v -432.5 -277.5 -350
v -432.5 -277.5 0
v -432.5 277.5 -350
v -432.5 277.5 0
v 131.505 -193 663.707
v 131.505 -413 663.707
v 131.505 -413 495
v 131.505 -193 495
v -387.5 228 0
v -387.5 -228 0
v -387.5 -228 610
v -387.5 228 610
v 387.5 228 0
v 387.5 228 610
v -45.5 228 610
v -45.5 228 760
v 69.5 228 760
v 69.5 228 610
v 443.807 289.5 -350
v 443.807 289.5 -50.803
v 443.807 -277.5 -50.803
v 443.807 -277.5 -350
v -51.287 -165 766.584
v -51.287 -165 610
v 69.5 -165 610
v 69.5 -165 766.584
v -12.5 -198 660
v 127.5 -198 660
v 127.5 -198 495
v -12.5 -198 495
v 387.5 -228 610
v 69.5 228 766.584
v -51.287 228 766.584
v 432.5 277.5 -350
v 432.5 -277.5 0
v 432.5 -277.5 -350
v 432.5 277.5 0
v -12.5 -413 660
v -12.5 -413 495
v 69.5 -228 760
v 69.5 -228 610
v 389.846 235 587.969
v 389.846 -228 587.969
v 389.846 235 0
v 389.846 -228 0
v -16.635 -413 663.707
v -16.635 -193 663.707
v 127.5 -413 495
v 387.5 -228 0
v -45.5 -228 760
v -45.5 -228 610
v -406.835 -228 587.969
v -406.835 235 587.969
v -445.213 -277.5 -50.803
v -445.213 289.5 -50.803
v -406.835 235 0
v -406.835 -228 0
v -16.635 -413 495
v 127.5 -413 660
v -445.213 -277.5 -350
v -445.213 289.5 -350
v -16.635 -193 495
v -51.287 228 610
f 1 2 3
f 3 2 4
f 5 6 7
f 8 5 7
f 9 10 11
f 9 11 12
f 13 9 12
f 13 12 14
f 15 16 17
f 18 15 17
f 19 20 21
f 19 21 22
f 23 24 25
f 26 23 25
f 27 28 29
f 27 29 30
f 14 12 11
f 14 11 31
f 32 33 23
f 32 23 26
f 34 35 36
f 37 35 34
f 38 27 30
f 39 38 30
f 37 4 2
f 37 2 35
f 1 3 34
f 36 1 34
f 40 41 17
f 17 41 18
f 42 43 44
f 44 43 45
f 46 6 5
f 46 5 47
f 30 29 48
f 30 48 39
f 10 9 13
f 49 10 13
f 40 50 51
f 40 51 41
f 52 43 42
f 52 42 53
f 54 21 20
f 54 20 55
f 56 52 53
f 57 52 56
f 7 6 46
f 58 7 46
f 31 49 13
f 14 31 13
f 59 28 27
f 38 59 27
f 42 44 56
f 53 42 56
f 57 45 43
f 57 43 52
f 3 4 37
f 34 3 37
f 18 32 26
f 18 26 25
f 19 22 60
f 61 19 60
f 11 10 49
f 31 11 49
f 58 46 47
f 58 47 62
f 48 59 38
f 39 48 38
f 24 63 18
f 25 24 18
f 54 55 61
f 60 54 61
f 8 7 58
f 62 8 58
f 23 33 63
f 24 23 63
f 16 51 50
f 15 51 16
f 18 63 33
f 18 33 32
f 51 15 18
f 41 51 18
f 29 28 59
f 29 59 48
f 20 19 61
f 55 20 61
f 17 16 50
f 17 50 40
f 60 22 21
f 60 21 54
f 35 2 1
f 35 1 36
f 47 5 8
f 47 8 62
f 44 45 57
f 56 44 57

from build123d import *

# Parameters (mm, degrees)
SCHIZZO1_W                        = 865
SCHIZZO1_H                        = 555
ESTRUSIONE_ESTRUSIONE1_DEPTH      = 350
SCHIZZO2_W                        = 775
SCHIZZO2_H                        = 456
ESTRUSIONE_ESTRUSIONE2_DEPTH      = 610
SCHIZZO3_W                        = 115
SCHIZZO3_H                        = 456
ESTRUSIONE_ESTRUSIONE3_DEPTH      = 150
ESTRUSIONE_ESTRUSIONE4_DEPTH      = 185
ESTRUSIONE_ESTRUSIONE4_DEPTH_BACK = 30
SCHIZZO4_W                        = 140
SCHIZZO4_H                        = 165
SCHIZZO5_W                        = 889.020655165
SCHIZZO5_H                        = 299.196711451
ESTRUSIONE_ESTRUSIONE5_DEPTH      = 567
SCHIZZO6_W                        = 796.680903304
SCHIZZO6_H                        = 587.968632113
ESTRUSIONE_ESTRUSIONE6_DEPTH      = 463
SCHIZZO7_W                        = 148.139846742
SCHIZZO7_H                        = 168.706943007
ESTRUSIONE_ESTRUSIONE7_DEPTH      = 220
SCHIZZO8_W                        = 120.787004933
SCHIZZO8_H                        = 156.583617578
ESTRUSIONE_ESTRUSIONE8_DEPTH      = 393


with BuildPart() as part:
    # Schizzo1 → Estrusione-Estrusione1 (new body)
    with BuildSketch(Plane.XY):
        Rectangle(SCHIZZO1_W, SCHIZZO1_H)
    extrude(amount=-ESTRUSIONE_ESTRUSIONE1_DEPTH)


with BuildPart() as body_2:
    # Schizzo2 → Estrusione-Estrusione2 (new body)
    with BuildSketch(Plane.XY):
        Rectangle(SCHIZZO2_W, SCHIZZO2_H)
    extrude(amount=ESTRUSIONE_ESTRUSIONE2_DEPTH)


with BuildPart() as body_3:
    # Schizzo3 → Estrusione-Estrusione3 (new body)
    with BuildSketch(Plane.XY.offset(610)):
        with Locations((12, 0)):
            Rectangle(SCHIZZO3_W, SCHIZZO3_H)
    extrude(amount=ESTRUSIONE_ESTRUSIONE3_DEPTH)


with BuildPart() as body_4:
    # Schizzo4 → Estrusione-Estrusione4 (new, two sides: drawn at the far end of the back side and taken through both)
    with BuildSketch(Plane(origin=(0, -228, 0), x_dir=(-1, 0, 0), z_dir=(0, -1, 0)).offset(-ESTRUSIONE_ESTRUSIONE4_DEPTH_BACK)):
        with Locations((-57.5, -577.5)):
            Rectangle(SCHIZZO4_W, SCHIZZO4_H)
    extrude(amount=ESTRUSIONE_ESTRUSIONE4_DEPTH + ESTRUSIONE_ESTRUSIONE4_DEPTH_BACK)


with BuildPart() as body_5:
    # Schizzo5 → Estrusione-Estrusione5 (new body)
    with BuildSketch(Plane(origin=(0, -277.5, 0), x_dir=(-1, 0, 0), z_dir=(0, -1, 0))):
        with Locations((0.702831723, 200.401644275)):
            Rectangle(SCHIZZO5_W, SCHIZZO5_H)
    extrude(amount=-ESTRUSIONE_ESTRUSIONE5_DEPTH)


with BuildPart() as body_6:
    # Schizzo6 → Estrusione-Estrusione6 (new body)
    with BuildSketch(Plane(origin=(0, -228, 0), x_dir=(-1, 0, 0), z_dir=(0, -1, 0))):
        with Locations((8.494274834, -293.984316057)):
            Rectangle(SCHIZZO6_W, SCHIZZO6_H)
    extrude(amount=-ESTRUSIONE_ESTRUSIONE6_DEPTH)


with BuildPart() as body_7:
    # Schizzo7 → Estrusione-Estrusione7 (new body)
    with BuildSketch(Plane(origin=(0, -413, 0), x_dir=(-1, 0, 0), z_dir=(0, -1, 0))):
        with Locations((-57.43485811, -579.353471504)):
            Rectangle(SCHIZZO7_W, SCHIZZO7_H)
    extrude(amount=-ESTRUSIONE_ESTRUSIONE7_DEPTH)


with BuildPart() as body_8:
    # Schizzo8 → Estrusione-Estrusione8 (new body)
    with BuildSketch(Plane(origin=(0, 228, 0), x_dir=(1, 0, 0), z_dir=(0, 1, 0))):
        with Locations((9.106497533, -688.291808789)):
            Rectangle(SCHIZZO8_W, SCHIZZO8_H)
    extrude(amount=-ESTRUSIONE_ESTRUSIONE8_DEPTH)


solid = Compound([part.part, body_2.part, body_3.part, body_4.part, body_5.part, body_6.part, body_7.part, body_8.part])
